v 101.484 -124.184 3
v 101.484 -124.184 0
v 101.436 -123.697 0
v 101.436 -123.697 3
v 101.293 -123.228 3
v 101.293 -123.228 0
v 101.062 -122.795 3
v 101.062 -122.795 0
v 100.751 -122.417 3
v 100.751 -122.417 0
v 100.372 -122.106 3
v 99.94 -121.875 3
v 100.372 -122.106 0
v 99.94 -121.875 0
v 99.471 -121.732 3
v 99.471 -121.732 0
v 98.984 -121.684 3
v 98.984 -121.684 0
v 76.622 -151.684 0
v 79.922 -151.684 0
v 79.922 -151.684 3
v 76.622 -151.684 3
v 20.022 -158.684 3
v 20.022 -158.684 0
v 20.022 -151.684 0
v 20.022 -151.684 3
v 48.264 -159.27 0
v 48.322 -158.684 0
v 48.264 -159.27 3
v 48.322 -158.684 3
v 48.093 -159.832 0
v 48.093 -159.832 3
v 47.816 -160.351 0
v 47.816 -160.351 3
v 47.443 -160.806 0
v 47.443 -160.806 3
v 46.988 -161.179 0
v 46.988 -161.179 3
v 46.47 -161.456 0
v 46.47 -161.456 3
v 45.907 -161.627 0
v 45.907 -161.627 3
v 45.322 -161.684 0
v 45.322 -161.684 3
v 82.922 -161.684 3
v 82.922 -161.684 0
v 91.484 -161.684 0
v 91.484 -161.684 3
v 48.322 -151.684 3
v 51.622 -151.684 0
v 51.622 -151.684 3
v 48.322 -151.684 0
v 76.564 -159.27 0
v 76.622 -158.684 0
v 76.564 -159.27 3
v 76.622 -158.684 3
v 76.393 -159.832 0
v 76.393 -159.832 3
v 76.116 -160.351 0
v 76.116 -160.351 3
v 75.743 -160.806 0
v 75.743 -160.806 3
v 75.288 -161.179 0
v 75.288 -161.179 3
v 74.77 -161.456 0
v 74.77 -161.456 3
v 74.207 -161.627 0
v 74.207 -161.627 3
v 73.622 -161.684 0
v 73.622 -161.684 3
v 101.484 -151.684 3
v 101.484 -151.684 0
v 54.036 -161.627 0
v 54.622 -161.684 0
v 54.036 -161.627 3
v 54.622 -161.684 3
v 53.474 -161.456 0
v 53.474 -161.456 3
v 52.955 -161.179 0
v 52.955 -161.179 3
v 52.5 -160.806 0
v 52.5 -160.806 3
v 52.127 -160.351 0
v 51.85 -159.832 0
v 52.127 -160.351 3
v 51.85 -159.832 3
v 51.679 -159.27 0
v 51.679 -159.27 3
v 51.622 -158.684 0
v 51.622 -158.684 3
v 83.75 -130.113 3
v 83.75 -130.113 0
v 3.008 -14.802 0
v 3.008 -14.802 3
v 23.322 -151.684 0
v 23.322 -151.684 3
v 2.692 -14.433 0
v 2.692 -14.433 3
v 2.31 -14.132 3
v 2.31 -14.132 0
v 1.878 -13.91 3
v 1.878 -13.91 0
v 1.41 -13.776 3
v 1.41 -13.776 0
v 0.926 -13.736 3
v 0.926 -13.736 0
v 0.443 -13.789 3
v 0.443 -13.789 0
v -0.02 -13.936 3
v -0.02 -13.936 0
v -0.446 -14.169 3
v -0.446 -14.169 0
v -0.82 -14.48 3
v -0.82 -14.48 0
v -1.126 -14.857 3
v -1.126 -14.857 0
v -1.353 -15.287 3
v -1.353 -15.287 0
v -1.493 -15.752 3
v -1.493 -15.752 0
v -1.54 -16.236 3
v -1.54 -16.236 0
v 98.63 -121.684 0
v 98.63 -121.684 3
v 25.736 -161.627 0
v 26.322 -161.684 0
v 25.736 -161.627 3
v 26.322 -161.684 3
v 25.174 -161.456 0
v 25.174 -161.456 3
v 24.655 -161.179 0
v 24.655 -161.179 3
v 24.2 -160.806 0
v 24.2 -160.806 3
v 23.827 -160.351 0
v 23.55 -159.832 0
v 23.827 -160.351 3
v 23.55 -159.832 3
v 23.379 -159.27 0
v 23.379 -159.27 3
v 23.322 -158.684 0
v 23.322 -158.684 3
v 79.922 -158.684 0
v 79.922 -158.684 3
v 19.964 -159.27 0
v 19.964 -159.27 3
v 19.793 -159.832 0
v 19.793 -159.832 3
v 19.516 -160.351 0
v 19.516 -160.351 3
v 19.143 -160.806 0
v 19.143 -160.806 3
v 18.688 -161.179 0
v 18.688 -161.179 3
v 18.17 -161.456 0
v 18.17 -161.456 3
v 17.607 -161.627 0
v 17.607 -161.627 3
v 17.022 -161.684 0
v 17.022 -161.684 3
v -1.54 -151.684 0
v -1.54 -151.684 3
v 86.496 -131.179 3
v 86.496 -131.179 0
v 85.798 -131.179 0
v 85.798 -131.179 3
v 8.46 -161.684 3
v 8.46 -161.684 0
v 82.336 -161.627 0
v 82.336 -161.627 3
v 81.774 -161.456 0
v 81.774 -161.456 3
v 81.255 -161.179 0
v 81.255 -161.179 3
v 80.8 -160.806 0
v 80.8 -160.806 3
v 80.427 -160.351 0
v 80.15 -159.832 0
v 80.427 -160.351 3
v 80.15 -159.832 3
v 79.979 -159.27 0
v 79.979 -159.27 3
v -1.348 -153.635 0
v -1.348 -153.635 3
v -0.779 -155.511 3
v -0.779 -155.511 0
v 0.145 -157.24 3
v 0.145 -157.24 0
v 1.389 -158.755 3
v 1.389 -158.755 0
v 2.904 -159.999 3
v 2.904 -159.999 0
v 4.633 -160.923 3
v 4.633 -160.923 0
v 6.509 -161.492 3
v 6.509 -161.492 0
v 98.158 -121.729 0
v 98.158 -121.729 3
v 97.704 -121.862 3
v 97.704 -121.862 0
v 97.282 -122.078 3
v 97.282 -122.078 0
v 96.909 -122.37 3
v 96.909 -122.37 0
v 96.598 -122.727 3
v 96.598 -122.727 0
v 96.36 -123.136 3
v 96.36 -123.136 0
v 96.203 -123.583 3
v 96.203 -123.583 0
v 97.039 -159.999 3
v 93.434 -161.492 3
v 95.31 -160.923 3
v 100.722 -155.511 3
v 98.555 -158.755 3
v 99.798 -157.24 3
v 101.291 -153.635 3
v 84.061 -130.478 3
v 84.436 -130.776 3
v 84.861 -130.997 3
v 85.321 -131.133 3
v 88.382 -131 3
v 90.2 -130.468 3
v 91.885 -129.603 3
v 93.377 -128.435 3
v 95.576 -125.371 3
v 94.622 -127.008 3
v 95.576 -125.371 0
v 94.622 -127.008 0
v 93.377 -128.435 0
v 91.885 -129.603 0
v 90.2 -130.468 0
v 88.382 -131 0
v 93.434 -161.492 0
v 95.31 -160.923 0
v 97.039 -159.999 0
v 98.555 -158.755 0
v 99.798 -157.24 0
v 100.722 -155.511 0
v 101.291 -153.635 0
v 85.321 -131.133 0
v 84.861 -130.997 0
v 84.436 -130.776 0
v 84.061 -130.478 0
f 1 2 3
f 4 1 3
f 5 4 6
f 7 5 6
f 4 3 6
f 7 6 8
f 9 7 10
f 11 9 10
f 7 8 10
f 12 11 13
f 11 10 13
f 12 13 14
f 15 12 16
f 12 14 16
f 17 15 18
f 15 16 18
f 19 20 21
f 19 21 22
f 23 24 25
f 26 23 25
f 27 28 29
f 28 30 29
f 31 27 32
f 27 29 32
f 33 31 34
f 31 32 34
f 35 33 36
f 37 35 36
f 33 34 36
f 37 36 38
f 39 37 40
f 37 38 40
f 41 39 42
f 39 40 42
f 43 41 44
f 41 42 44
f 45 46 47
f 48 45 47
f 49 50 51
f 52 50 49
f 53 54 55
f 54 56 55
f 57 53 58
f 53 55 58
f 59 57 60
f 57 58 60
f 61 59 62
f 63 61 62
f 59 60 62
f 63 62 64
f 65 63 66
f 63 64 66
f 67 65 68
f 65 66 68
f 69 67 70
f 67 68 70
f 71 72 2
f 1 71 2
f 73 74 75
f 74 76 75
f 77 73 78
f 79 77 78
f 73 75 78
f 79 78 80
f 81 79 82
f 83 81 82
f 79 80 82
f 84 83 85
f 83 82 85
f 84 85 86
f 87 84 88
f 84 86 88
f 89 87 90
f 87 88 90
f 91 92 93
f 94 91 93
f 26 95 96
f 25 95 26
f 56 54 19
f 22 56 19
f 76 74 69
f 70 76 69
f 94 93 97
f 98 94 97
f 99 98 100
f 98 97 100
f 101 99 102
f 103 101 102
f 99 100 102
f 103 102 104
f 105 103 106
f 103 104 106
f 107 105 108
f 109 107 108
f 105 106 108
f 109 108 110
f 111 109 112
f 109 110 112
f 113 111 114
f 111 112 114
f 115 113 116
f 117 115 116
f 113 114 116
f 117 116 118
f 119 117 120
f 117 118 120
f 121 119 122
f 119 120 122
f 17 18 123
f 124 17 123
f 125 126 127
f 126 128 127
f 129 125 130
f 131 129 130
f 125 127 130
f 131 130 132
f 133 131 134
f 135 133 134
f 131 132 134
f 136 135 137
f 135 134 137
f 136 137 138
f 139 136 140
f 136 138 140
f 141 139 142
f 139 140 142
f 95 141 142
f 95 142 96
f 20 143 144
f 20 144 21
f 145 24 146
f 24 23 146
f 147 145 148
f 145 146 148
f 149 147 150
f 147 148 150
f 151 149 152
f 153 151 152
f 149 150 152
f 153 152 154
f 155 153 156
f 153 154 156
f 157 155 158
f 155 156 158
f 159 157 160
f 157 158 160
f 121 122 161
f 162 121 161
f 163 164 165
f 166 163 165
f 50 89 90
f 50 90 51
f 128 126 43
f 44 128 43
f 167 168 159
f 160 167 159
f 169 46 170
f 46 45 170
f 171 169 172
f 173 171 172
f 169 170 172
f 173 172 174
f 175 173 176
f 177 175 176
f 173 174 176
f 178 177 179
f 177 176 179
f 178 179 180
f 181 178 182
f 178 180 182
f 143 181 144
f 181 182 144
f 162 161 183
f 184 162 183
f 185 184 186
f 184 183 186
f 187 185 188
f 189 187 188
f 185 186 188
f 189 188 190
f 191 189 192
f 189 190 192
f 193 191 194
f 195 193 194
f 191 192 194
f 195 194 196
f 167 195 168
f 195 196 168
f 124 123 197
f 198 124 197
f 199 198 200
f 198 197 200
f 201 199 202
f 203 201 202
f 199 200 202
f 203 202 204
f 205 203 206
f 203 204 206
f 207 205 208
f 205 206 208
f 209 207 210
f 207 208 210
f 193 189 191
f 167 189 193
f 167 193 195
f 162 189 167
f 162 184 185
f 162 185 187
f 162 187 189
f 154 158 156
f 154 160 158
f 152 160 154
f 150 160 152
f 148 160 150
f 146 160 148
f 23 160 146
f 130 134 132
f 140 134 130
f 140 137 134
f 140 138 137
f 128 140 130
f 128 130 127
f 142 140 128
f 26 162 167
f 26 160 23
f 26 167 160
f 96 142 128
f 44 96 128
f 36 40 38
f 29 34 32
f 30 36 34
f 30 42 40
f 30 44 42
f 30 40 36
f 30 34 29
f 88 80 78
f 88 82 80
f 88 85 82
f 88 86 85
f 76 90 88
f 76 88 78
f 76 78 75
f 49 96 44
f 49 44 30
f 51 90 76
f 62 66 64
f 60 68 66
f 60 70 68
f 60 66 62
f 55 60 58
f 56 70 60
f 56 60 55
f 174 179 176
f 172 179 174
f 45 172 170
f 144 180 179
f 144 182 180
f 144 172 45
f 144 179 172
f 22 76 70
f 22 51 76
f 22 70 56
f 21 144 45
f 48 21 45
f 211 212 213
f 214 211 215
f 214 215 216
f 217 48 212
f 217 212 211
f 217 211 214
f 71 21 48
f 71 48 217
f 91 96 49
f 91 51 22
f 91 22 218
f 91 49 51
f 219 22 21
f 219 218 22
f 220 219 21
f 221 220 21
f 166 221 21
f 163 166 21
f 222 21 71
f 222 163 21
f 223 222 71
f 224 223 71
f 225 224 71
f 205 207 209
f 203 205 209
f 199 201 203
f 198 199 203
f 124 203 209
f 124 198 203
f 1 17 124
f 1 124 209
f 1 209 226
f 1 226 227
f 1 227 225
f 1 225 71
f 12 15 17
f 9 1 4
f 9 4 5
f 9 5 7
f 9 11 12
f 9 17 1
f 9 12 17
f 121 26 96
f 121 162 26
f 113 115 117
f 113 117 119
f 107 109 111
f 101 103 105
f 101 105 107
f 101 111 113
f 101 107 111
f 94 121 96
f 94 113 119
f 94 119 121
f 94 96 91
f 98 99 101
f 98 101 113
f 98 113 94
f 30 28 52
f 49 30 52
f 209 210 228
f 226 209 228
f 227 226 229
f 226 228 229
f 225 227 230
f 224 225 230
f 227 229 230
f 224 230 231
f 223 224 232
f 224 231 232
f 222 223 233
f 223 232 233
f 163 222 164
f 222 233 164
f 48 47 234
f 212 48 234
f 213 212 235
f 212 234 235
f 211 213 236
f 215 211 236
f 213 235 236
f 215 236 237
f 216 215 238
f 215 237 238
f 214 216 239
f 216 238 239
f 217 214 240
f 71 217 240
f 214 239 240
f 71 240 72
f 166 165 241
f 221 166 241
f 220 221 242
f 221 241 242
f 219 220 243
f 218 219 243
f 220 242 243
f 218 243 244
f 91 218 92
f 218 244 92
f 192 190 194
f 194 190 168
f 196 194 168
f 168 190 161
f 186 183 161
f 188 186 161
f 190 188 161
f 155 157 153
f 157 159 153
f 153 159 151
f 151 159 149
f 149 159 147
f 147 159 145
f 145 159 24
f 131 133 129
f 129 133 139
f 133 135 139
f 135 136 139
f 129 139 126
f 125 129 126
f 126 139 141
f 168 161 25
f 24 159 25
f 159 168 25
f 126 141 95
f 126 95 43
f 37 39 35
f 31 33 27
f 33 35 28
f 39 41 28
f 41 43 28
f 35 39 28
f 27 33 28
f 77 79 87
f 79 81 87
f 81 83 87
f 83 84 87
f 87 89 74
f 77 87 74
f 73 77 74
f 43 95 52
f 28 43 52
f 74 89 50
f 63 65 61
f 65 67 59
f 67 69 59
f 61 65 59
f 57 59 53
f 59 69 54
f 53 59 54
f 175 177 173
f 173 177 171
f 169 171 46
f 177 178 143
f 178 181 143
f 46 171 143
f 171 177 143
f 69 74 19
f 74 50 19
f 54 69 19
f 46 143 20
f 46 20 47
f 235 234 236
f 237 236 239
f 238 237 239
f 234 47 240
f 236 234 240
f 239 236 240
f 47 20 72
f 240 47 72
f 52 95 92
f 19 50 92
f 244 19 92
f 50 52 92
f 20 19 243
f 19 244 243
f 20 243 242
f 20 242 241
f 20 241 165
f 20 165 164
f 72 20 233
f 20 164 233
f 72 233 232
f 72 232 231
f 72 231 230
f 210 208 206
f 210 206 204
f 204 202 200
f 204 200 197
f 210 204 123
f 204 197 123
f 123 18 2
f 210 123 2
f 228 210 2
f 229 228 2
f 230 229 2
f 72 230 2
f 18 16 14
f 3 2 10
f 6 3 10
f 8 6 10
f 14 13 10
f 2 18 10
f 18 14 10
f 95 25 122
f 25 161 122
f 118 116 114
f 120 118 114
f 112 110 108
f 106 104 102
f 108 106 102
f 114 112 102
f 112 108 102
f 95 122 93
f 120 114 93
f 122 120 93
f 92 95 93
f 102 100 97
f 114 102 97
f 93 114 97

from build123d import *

# Parameters (mm, degrees)
BOSS_EXTRUDE1_DEPTH = 3
SKETCH3_W           = 3.3
SKETCH3_H           = 10
CUT_EXTRUDE1_DEPTH  = 4
FILLET1_R           = 3


with BuildPart() as part:
    # Sketch1 → Boss-Extrude1 (new body)
    with BuildSketch(Plane.XY):
        with BuildLine():
            Line((86.496300823, -131.179339344), (85.797718449, -131.179339344))
            ThreePointArc((85.797718449, -131.179339344), (84.643346916, -130.896866427), (83.749838339, -130.113280435))
            Line((83.749838339, -130.113280435), (3.007715481, -14.801578616))
            ThreePointArc((3.007715481, -14.801578616), (0.208070871, -13.85122733), (-1.54016463, -16.235519707))
            Line((-1.54016463, -16.235519707), (-1.54016463, -151.684305639))
            ThreePointArc((-1.54016463, -151.684305639), (1.388767558, -158.75537345), (8.45983537, -161.684305639))
            Line((8.45983537, -161.684305639), (91.483543137, -161.684305639))
            ThreePointArc((91.483543137, -161.684305639), (98.554610949, -158.75537345), (101.483543137, -151.684305639))
            Line((101.483543137, -151.684305639), (101.483543137, -124.184305639))
            ThreePointArc((101.483543137, -124.184305639), (100.75131009, -122.416538686), (98.983543137, -121.684305639))
            Line((98.983543137, -121.684305639), (98.629733048, -121.684305639))
            ThreePointArc((98.629733048, -121.684305639), (97.08903242, -122.215488335), (96.203046603, -123.58331238))
            ThreePointArc((96.203046603, -123.58331238), (92.659103337, -129.054608557), (86.496300823, -131.179339344))
        make_face()
    extrude(amount=BOSS_EXTRUDE1_DEPTH)

    # Sketch3 → Cut-Extrude1 (cut, through all)
    with BuildSketch(Plane(origin=(0, 0, 0), x_dir=(-1, 0, 0), z_dir=(0, 0, -1))):
        with Locations((-49.971689254, -156.684305639)):
            Rectangle(SKETCH3_W, SKETCH3_H)
        with Locations((-21.671689254, -156.684305639)):
            Rectangle(SKETCH3_W, SKETCH3_H)
        with Locations((-78.271689254, -156.684305639)):
            Rectangle(SKETCH3_W, SKETCH3_H)
    extrude(amount=-CUT_EXTRUDE1_DEPTH, mode=Mode.SUBTRACT)

    # Fillet1
    fillet1_edges = [part.edges().sort_by_distance(p)[0] for p in [
        (23.321689254, -161.684305639, 1.5),
        (20.021689254, -161.684305639, 1.5),
        (76.621689254, -161.684305639, 1.5),
        (79.921689254, -161.684305639, 1.5),
        (48.321689254, -161.684305639, 1.5),
        (51.621689254, -161.684305639, 1.5),
    ]]
    fillet(fillet1_edges, radius=FILLET1_R)


solid = part.part
